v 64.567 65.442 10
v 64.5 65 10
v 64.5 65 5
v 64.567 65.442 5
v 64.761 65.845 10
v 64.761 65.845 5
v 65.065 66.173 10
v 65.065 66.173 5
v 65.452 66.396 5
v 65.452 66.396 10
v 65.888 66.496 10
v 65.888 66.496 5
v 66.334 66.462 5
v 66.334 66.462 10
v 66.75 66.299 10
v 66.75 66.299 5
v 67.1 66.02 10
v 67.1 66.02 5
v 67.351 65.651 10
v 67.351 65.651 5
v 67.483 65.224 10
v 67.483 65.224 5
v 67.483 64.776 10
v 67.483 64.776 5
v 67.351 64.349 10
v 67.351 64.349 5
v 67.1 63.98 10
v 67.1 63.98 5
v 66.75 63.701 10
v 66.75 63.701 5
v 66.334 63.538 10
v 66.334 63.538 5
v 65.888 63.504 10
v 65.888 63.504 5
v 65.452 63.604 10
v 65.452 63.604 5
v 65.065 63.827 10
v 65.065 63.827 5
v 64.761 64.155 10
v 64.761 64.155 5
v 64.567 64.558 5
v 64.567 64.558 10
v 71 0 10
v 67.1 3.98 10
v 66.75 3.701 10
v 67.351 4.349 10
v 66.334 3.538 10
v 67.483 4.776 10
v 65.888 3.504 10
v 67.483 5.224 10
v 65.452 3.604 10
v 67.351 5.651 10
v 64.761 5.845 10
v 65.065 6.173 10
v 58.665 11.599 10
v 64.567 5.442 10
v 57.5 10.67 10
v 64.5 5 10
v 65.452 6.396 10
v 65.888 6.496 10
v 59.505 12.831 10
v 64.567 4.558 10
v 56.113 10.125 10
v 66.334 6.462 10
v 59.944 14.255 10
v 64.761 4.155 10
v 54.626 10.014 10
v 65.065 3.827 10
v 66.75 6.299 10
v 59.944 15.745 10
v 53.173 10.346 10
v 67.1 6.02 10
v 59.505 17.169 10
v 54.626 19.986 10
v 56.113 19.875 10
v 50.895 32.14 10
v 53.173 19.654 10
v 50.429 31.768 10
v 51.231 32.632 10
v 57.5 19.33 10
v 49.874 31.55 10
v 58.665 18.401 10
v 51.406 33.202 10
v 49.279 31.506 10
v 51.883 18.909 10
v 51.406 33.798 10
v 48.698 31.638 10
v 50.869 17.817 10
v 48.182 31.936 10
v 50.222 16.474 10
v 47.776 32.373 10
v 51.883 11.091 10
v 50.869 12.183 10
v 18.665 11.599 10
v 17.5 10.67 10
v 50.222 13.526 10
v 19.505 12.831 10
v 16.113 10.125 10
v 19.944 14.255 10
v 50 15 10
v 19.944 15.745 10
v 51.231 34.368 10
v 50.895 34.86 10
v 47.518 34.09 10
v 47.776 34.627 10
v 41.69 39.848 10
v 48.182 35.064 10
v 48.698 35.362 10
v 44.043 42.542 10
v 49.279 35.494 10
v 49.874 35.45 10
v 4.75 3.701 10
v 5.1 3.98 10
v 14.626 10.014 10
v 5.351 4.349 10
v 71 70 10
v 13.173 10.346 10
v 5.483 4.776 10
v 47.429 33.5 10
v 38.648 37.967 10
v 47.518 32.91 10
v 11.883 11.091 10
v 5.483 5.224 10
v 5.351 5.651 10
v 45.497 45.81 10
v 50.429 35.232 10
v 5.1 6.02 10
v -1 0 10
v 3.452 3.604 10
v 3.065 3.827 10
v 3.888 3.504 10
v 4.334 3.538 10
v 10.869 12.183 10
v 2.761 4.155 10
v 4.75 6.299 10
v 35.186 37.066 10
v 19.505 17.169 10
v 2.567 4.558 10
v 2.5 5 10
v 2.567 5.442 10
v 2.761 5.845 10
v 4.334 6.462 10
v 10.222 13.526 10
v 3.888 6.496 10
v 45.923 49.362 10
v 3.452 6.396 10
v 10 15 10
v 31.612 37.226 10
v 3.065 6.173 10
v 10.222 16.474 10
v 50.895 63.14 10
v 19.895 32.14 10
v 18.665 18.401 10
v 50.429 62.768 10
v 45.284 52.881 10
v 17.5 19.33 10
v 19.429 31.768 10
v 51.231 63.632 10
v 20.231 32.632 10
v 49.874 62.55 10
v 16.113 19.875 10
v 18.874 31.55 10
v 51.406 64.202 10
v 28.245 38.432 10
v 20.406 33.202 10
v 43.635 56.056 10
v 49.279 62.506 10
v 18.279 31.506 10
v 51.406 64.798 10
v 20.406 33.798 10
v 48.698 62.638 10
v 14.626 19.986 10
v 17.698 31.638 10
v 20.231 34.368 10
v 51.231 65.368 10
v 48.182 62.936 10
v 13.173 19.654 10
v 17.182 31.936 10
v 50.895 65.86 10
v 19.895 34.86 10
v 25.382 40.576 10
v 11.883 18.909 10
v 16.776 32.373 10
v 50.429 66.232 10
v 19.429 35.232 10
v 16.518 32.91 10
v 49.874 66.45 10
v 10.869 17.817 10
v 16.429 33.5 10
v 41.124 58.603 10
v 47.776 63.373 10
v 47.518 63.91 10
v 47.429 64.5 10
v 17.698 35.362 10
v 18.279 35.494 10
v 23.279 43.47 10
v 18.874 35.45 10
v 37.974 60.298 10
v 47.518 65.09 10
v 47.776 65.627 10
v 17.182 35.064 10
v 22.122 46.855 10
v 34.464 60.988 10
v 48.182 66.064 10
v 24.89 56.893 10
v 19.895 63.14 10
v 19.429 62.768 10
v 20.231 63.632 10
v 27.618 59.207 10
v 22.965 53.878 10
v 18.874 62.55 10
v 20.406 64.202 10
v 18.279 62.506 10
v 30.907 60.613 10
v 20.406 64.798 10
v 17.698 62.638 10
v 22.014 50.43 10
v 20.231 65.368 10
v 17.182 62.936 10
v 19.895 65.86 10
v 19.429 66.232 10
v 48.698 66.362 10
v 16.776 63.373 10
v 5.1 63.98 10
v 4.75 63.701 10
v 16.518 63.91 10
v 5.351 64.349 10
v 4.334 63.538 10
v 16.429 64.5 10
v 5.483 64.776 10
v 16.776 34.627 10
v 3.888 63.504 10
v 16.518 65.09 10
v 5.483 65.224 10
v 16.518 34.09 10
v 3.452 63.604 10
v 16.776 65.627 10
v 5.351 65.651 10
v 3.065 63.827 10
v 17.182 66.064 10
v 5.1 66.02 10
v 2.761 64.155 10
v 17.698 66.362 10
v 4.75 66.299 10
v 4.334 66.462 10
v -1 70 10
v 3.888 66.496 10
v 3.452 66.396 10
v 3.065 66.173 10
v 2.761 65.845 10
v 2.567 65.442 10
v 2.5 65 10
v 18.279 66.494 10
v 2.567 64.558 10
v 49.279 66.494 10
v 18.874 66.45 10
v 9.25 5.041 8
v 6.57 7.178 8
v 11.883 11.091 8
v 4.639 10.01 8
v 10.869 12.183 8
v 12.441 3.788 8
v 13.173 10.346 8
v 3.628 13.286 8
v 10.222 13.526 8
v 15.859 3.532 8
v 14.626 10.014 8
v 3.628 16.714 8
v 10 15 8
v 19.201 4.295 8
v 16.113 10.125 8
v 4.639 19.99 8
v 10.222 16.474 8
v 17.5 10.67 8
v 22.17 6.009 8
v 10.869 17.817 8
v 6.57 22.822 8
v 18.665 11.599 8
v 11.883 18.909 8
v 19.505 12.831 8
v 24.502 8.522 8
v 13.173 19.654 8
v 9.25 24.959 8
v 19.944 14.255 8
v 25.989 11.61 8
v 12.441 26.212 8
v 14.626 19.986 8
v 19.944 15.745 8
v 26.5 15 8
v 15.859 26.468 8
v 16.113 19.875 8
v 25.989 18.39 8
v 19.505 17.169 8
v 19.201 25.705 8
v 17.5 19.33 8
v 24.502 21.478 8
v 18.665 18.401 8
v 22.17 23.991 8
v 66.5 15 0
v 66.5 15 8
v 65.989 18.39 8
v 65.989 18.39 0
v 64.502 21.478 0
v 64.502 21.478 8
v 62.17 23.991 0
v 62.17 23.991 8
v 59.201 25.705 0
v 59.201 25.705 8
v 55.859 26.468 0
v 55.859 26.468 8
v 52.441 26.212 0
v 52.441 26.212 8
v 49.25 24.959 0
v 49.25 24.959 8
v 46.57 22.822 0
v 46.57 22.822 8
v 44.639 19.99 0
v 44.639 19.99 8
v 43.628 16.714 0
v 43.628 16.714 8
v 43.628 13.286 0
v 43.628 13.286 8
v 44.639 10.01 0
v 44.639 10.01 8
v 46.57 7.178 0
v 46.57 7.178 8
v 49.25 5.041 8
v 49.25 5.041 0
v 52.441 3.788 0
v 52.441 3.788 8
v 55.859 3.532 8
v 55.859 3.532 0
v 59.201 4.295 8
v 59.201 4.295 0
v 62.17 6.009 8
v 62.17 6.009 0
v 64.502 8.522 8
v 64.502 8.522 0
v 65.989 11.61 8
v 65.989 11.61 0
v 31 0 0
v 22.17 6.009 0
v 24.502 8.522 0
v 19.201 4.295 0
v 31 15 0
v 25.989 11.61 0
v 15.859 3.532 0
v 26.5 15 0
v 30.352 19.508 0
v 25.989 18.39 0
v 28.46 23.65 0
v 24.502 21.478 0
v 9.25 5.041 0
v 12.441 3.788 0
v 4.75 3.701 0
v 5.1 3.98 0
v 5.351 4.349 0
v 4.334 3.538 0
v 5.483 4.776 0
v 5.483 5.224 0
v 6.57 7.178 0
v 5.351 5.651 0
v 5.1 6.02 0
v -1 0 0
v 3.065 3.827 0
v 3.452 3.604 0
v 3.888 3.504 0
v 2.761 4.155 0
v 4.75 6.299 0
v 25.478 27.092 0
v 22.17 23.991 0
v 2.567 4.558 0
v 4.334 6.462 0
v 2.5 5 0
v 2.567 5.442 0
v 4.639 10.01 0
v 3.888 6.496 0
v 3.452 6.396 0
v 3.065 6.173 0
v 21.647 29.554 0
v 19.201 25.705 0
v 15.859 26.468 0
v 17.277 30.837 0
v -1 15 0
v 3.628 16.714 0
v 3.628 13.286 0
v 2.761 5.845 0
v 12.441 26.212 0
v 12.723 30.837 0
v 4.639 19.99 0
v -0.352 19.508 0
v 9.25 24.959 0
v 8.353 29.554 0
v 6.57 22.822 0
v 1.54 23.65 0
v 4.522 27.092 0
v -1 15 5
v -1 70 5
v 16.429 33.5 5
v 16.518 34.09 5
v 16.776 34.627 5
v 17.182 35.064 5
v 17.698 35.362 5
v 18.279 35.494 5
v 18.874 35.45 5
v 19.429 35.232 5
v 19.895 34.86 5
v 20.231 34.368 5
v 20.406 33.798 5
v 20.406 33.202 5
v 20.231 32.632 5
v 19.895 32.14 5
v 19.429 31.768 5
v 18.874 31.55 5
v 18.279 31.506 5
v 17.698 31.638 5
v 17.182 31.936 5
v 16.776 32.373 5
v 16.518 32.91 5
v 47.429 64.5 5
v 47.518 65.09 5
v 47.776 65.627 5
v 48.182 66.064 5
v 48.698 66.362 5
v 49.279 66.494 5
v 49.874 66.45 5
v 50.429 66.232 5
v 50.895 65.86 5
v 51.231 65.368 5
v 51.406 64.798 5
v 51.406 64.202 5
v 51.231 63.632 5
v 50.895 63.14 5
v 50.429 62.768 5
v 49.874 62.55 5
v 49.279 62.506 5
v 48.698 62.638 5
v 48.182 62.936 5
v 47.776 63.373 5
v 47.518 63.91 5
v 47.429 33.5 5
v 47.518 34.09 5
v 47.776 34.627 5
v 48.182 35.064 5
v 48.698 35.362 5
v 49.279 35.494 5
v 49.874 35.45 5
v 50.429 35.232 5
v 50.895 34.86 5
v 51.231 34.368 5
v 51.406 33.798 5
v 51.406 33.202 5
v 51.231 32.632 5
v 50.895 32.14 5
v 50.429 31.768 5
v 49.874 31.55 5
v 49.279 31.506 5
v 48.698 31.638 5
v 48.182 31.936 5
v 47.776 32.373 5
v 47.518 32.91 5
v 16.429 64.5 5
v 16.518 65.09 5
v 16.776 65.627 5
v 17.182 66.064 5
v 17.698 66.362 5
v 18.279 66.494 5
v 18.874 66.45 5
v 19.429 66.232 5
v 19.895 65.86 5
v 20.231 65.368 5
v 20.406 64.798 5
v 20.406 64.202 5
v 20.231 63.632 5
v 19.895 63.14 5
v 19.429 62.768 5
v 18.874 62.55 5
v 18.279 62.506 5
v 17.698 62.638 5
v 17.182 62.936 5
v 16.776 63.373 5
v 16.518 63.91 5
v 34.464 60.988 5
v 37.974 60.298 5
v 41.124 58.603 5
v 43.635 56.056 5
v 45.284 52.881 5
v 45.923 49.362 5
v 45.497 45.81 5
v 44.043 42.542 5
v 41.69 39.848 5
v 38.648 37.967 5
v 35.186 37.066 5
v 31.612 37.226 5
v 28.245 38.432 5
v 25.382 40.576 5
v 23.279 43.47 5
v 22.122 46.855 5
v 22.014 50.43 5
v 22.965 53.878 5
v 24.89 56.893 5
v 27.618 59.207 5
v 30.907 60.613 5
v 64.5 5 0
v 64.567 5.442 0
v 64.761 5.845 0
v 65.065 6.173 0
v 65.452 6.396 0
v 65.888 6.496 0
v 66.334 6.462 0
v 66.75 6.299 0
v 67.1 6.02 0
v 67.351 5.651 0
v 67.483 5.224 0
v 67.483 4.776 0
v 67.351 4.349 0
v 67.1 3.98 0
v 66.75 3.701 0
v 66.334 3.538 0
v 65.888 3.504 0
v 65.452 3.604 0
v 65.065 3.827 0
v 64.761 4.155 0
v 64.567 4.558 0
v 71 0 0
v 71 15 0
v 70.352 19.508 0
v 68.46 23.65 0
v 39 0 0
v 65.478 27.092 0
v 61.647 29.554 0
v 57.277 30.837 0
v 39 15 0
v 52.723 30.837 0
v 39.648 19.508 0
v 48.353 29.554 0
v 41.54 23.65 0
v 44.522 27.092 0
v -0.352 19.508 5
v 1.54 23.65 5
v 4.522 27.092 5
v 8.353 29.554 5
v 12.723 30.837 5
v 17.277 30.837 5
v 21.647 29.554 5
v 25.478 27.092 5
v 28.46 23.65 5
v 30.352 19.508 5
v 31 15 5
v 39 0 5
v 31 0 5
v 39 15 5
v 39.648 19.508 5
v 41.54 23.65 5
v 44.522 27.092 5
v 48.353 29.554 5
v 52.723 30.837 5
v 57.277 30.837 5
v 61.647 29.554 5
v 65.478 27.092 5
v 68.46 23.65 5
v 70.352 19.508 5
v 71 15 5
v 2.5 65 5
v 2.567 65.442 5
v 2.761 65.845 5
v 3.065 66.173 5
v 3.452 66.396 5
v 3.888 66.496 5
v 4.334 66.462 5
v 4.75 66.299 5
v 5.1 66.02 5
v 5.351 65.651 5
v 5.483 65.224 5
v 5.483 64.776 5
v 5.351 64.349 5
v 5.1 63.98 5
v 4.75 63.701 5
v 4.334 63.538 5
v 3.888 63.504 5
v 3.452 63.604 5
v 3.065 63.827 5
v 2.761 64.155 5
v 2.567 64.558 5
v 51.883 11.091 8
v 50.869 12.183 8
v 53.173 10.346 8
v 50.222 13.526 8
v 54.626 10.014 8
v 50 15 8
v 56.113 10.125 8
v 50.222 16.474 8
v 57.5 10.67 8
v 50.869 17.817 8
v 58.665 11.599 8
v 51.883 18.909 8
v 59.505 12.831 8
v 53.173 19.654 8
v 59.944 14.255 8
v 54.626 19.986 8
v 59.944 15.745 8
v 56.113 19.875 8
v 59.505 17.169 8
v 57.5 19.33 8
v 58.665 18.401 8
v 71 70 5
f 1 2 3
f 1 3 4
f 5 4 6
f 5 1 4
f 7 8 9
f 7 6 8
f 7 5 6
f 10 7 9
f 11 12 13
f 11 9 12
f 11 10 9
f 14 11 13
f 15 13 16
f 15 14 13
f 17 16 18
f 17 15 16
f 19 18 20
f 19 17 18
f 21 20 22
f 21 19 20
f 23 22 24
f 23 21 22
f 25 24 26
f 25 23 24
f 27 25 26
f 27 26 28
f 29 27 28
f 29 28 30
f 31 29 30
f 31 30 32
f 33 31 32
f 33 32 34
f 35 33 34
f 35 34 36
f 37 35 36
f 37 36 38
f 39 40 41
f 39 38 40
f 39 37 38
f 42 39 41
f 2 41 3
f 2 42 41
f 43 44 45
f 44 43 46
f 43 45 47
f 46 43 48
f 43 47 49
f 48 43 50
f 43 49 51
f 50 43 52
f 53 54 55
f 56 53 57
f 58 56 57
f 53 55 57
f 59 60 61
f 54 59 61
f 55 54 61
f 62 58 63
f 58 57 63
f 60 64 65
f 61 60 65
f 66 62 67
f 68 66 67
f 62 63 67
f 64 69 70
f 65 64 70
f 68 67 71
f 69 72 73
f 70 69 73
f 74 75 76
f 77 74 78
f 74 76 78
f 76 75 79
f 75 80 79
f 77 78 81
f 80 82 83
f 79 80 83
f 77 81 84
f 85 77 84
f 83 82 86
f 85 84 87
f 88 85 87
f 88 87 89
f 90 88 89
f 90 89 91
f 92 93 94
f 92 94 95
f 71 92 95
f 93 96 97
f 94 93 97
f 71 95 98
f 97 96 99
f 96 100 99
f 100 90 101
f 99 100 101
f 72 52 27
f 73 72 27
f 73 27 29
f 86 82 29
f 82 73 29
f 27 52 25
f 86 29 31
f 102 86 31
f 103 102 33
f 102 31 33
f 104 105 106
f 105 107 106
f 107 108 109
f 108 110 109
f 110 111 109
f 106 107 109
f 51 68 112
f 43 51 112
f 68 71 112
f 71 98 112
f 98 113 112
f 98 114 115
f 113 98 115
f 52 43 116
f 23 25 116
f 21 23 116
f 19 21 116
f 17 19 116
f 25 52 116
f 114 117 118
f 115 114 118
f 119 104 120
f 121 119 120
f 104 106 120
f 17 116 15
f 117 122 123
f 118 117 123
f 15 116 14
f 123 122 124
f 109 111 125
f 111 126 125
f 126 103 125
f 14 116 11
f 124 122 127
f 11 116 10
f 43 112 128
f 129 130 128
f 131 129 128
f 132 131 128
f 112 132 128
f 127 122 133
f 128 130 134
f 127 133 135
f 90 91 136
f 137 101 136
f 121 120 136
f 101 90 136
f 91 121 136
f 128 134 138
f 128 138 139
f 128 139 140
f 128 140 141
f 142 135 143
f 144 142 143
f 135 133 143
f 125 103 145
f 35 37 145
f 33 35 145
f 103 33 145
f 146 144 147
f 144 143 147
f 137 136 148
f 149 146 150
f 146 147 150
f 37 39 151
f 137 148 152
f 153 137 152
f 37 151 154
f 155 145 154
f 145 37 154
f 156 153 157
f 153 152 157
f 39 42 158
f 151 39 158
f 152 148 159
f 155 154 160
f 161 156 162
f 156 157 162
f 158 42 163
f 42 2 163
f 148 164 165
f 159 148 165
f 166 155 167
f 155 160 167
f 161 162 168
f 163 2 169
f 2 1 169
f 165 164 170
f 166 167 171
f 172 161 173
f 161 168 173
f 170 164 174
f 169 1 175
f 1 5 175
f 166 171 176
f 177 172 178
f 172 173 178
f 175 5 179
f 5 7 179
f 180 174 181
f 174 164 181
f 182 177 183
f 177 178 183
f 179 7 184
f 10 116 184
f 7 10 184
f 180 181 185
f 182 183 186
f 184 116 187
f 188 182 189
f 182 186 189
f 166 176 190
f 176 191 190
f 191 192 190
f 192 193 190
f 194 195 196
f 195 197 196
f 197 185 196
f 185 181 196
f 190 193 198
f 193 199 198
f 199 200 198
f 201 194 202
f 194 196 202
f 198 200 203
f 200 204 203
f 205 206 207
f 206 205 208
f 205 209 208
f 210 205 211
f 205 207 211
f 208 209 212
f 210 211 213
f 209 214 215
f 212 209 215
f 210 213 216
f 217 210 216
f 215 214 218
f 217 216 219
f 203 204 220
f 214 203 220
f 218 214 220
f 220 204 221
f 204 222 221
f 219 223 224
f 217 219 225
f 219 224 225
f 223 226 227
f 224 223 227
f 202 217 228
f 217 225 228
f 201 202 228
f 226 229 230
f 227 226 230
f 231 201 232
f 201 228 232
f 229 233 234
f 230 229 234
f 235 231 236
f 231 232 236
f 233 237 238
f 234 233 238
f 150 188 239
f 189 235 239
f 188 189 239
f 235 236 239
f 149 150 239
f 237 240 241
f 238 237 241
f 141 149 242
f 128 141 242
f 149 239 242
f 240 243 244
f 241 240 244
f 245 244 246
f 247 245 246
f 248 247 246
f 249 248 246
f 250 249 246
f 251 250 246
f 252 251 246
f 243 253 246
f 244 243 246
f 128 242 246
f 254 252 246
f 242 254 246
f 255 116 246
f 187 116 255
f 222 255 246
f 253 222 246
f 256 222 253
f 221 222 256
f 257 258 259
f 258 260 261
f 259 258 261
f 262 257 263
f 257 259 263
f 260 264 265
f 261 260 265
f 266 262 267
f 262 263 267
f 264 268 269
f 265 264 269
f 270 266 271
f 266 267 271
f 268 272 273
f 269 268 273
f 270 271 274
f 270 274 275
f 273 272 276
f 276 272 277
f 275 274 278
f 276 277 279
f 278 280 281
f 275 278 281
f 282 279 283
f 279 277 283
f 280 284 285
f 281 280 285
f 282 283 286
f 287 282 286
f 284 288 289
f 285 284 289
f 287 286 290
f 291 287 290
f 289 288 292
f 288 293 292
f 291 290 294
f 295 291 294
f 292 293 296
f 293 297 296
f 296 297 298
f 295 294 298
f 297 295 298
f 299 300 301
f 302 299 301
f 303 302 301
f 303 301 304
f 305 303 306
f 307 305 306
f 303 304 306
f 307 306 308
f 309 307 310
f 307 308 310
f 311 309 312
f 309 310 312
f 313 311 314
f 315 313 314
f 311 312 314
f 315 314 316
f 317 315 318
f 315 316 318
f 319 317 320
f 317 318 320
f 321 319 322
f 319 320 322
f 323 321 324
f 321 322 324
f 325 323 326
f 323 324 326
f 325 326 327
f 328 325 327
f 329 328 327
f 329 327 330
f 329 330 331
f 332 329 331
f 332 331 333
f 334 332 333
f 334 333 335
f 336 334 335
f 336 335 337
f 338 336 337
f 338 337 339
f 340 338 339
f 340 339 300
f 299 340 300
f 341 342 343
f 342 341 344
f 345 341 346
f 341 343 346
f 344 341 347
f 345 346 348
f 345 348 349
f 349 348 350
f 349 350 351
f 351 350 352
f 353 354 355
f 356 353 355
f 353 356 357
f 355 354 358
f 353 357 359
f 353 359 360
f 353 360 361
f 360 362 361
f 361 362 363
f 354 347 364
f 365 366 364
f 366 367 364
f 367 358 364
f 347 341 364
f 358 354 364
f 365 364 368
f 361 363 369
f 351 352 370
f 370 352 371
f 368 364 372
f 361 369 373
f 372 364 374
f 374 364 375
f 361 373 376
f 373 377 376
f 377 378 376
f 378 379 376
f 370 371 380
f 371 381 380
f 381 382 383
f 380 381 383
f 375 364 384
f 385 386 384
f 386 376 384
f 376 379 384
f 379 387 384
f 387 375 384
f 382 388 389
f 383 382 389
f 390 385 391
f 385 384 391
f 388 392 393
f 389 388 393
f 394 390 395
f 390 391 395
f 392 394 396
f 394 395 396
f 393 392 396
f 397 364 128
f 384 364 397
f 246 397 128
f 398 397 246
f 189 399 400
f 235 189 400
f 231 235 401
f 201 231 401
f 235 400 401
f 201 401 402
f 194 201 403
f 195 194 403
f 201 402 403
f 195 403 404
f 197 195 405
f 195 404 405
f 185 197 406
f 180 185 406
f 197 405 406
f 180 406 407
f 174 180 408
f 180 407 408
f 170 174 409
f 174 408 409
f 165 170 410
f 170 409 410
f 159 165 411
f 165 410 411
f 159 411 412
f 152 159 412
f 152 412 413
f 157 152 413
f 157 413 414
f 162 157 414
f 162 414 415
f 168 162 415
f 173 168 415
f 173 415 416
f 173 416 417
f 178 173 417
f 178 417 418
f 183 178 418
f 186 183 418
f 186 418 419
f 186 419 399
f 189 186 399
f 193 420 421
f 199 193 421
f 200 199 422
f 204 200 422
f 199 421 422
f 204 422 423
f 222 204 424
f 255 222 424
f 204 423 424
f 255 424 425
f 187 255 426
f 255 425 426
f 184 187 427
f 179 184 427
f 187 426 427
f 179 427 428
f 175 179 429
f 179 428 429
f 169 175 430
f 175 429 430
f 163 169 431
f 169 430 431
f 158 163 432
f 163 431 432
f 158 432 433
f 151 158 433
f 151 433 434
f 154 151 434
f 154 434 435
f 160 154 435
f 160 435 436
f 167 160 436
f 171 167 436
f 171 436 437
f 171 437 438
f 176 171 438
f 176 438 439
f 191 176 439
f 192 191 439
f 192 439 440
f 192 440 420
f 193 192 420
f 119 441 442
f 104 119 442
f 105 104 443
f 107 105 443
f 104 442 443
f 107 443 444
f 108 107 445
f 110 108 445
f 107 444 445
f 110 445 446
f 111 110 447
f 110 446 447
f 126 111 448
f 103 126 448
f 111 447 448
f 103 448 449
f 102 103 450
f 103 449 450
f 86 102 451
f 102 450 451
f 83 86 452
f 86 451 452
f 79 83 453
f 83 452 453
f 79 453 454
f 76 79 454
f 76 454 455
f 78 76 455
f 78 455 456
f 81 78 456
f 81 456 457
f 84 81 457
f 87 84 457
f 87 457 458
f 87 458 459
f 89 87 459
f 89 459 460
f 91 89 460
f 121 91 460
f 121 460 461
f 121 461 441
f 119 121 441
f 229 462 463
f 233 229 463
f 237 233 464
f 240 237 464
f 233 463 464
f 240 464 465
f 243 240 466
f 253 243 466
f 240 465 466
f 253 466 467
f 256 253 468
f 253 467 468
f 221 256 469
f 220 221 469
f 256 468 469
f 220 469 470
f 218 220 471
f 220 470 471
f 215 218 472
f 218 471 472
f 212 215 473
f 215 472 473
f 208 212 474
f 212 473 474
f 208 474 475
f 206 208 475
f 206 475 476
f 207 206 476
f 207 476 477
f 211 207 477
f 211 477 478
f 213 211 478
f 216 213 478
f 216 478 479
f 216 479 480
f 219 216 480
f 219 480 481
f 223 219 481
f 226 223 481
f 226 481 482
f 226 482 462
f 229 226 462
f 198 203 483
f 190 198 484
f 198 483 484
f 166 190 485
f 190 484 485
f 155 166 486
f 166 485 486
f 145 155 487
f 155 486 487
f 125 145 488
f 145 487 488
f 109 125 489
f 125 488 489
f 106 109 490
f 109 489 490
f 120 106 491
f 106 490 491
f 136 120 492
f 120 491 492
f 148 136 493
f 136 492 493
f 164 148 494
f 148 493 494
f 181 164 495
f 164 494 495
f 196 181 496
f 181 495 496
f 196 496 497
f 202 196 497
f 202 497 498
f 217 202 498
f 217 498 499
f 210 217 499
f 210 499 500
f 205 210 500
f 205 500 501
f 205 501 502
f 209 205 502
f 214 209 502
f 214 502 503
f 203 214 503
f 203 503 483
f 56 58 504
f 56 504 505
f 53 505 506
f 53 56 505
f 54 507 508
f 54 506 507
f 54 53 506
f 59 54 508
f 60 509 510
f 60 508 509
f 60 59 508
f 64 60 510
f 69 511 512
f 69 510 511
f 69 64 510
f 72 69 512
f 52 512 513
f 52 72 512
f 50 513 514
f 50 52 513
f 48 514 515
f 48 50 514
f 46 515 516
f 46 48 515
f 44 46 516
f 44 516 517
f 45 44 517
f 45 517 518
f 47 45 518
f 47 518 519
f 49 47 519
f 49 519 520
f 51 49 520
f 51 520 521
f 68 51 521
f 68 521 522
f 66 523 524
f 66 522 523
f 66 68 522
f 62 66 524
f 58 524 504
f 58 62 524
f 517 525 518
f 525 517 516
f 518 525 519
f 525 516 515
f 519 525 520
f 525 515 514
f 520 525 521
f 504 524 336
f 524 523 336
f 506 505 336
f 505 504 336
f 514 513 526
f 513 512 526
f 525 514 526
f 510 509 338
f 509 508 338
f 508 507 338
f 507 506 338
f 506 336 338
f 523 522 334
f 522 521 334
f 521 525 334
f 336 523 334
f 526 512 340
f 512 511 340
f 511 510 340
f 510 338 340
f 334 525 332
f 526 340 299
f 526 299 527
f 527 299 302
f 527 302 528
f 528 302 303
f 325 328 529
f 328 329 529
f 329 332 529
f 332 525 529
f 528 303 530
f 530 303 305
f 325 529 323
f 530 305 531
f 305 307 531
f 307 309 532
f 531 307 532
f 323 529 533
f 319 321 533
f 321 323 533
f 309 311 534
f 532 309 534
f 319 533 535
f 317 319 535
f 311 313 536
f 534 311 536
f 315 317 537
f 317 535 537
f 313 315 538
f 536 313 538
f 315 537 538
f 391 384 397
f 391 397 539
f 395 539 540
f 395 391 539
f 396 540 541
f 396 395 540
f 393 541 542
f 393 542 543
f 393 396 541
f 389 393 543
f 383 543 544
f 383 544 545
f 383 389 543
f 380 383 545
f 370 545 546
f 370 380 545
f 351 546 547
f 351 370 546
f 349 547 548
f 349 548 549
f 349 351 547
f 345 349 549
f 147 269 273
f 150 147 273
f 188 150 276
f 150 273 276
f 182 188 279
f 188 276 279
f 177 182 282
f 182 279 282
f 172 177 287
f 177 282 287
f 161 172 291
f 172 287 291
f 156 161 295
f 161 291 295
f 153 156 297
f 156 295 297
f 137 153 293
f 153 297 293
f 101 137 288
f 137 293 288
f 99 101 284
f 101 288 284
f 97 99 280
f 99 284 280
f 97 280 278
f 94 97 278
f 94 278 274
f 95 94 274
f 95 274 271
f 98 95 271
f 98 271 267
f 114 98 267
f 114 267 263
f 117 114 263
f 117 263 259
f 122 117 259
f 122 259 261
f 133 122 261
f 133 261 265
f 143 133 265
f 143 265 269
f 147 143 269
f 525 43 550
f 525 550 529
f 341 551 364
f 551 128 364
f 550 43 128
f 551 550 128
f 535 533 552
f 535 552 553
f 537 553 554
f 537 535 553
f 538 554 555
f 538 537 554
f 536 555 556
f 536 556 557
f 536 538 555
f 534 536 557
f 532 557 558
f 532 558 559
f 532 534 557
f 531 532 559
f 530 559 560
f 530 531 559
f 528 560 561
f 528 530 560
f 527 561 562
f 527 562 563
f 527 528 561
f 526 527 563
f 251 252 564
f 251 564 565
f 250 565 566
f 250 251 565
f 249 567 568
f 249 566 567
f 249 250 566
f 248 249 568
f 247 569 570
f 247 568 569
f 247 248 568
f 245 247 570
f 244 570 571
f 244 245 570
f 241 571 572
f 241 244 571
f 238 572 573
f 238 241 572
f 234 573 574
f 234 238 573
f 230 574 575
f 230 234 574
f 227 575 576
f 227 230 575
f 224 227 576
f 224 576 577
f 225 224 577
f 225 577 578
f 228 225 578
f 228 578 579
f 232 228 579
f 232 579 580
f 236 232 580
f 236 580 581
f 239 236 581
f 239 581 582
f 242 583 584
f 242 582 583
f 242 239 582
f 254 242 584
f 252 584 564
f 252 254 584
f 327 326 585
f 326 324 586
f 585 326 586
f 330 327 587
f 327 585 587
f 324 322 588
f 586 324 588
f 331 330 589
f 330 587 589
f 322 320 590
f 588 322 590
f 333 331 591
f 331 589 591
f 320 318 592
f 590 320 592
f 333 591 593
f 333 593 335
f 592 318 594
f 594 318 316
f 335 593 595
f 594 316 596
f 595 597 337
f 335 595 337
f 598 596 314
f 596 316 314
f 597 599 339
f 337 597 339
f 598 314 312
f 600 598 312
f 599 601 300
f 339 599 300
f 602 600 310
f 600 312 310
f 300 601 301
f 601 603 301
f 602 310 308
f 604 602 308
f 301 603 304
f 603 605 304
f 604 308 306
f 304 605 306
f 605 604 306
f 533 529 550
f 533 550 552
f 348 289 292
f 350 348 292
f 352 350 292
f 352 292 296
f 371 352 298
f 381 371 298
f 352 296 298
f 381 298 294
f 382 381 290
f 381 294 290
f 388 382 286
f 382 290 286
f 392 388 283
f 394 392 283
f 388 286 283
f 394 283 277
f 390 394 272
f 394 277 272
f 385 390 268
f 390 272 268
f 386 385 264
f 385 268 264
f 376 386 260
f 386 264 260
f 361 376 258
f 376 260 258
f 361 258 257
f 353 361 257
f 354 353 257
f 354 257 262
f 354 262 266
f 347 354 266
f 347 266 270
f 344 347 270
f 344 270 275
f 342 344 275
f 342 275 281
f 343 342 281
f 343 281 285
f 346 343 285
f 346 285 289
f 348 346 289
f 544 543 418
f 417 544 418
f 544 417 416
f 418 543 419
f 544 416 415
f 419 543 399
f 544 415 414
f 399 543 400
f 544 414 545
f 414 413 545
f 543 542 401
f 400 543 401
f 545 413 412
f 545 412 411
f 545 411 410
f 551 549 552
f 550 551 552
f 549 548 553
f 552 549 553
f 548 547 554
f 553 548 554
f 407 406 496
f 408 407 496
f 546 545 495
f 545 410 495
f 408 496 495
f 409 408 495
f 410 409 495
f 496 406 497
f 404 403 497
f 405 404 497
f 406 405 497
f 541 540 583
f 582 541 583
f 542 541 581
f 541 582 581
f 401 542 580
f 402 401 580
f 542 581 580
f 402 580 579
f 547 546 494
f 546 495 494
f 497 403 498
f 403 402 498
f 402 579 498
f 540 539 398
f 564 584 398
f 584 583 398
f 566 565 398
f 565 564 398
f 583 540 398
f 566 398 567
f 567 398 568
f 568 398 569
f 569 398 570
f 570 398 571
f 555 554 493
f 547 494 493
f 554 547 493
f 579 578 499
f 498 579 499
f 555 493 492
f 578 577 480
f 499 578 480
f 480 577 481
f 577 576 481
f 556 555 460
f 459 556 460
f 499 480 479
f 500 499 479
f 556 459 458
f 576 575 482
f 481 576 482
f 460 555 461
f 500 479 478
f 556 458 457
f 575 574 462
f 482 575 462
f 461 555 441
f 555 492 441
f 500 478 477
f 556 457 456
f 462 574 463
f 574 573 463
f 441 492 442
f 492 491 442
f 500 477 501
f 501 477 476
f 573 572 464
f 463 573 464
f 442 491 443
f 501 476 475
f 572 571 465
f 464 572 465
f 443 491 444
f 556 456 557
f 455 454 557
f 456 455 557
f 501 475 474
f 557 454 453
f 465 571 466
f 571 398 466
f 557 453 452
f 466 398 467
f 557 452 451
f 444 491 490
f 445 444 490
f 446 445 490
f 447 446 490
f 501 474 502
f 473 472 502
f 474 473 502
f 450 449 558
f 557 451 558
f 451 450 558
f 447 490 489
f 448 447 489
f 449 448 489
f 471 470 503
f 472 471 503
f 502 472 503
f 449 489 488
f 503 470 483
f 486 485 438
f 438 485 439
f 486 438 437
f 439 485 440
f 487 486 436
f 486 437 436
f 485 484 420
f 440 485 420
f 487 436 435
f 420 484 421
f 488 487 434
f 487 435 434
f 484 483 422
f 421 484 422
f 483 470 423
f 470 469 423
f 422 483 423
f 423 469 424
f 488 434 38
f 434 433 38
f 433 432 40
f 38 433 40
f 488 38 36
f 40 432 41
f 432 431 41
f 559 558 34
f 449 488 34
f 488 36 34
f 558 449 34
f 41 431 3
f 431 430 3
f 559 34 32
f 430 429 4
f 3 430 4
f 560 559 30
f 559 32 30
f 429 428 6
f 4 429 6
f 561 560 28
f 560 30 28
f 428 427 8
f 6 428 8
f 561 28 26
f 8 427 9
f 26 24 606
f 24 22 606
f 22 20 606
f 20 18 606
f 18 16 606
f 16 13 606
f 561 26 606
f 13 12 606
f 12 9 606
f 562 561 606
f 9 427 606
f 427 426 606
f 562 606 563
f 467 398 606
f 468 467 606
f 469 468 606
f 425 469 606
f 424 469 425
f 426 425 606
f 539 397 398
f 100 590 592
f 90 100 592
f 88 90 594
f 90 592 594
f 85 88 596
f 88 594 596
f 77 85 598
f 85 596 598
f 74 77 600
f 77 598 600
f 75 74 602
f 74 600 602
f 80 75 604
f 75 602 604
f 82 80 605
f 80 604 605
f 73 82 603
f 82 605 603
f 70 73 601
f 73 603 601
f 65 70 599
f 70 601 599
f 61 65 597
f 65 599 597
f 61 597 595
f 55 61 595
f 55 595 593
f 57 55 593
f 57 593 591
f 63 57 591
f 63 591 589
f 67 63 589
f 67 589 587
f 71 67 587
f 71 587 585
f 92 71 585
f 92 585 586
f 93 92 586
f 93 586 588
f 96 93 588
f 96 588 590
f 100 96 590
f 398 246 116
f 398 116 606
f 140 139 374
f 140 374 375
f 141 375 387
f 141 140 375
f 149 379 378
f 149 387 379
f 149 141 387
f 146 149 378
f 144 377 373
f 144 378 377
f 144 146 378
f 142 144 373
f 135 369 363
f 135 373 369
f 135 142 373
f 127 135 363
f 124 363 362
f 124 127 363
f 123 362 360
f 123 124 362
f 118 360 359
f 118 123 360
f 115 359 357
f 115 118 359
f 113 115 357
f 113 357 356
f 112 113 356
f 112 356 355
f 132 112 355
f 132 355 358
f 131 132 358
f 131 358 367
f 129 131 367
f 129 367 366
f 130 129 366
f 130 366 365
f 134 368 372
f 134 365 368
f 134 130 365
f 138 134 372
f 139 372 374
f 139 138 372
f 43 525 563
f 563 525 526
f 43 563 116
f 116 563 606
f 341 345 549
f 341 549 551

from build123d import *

# Parameters (mm, degrees)
SKETCH1_W               = 70
SKETCH1_H               = 70
BOSS_EXTRUDE1_DEPTH     = 10
SKETCH2_R               = 12
SKETCH2_R_2             = 2
SKETCH2_R_3             = 11.5
CUT_EXTRUDE1_DEPTH      = 10
SKETCH3_W               = 10
SKETCH3_H               = 70
BOSS_EXTRUDE2_DEPTH     = 15
SKETCH4_W               = 10
SKETCH4_H               = 70
BOSS_EXTRUDE3_DEPTH     = 15
SKETCH5_R               = 11.5
SKETCH5_R_2             = 4
BOSS_EXTRUDE4_DEPTH     = 2
SKETCH6_R               = 1.5
SKETCH6_R_2             = 1.648708122
CUT_EXTRUDE3_DEPTH      = 10
BOSS_EXTRUDE5_START     = -10
SKETCH7_R               = 11.986708095
SKETCH7_R_2             = 2
BOSS_EXTRUDE5_DEPTH     = 10
SKETCH8_R               = 12
CUT_EXTRUDE4_DEPTH      = 10
SKETCH9_R               = 2
CUT_EXTRUDE5_DEPTH      = 10
CUT_EXTRUDE7_DEPTH      = 5
SKETCH15_W              = 14
SKETCH15_H              = 70
CUT_EXTRUDE8_DEPTH      = 5
CUT_EXTRUDE9_DEPTH      = 19
CUT_EXTRUDE9_DEPTH_BACK = 48
SKETCH16_R              = 1.5
SKETCH17_R              = 5
CUT_EXTRUDE10_DEPTH     = 19
SKETCH18_R              = 16.289174866
SKETCH18_R_2            = 12
BOSS_EXTRUDE6_DEPTH     = 5


with BuildPart() as part:
    # Sketch1 → Boss-Extrude1 (new body)
    with BuildSketch(Plane.XY):
        with Locations((35, 35)):
            Rectangle(SKETCH1_W, SKETCH1_H)
    extrude(amount=BOSS_EXTRUDE1_DEPTH)

    # Sketch2 → Cut-Extrude1 (cut)
    with BuildSketch(Plane.XY.offset(10)):
        with Locations((35, 49)):
            Circle(SKETCH2_R)
        with Locations((19.5, 65)):
            Circle(SKETCH2_R_2)
        with Locations((50.5, 65)):
            Circle(SKETCH2_R_2)
        with Locations((19.5, 34)):
            Circle(SKETCH2_R_2)
        with Locations((50.5, 34)):
            Circle(SKETCH2_R_2)
        with Locations((15, 15)):
            Circle(SKETCH2_R_3)
        with Locations((55, 15)):
            Circle(SKETCH2_R_3)
    extrude(amount=-CUT_EXTRUDE1_DEPTH, mode=Mode.SUBTRACT)

    # Sketch3 → Boss-Extrude2 (add)
    with BuildSketch(Plane.ZY):
        with Locations((5, 35)):
            Rectangle(SKETCH3_W, SKETCH3_H)
    extrude(amount=BOSS_EXTRUDE2_DEPTH)

    # Sketch4 → Boss-Extrude3 (add)
    with BuildSketch(Plane(origin=(70, 0, 0), x_dir=(0, 0, -1), z_dir=(1, 0, 0))):
        with Locations((-5, 35)):
            Rectangle(SKETCH4_W, SKETCH4_H)
    extrude(amount=BOSS_EXTRUDE3_DEPTH)

    # Sketch5 → Boss-Extrude4 (add)
    # profile 1 of 2: a face of its own
    with BuildSketch(Plane.XY.offset(10)):
        with Locations((15, 15)):
            Circle(SKETCH5_R)
        with Locations((15, 15)):
            Circle(SKETCH5_R_2, mode=Mode.SUBTRACT)
    # profile 2 of 2: a face of its own
    with BuildSketch(Plane.XY.offset(10)):
        with Locations((55, 15)):
            Circle(SKETCH5_R)
        with Locations((55, 15)):
            Circle(SKETCH5_R_2, mode=Mode.SUBTRACT)
    extrude(amount=-BOSS_EXTRUDE4_DEPTH)

    # Sketch6 → Cut-Extrude3 (cut)
    with BuildSketch(Plane(origin=(0, 0, 0), x_dir=(-1, 0, 0), z_dir=(0, 0, -1))):
        with Locations((-80, 65)):
            Circle(SKETCH6_R)
        with Locations((-80, 5)):
            Circle(SKETCH6_R)
        with Locations((10, 65)):
            Circle(SKETCH6_R_2)
        with Locations((10, 5)):
            Circle(SKETCH6_R)
    extrude(amount=-CUT_EXTRUDE3_DEPTH, mode=Mode.SUBTRACT)

    # Sketch7 → Boss-Extrude5 (add)
    with BuildSketch(Plane(origin=(0, 0, 0), x_dir=(-1, 0, 0), z_dir=(0, 0, -1)).offset(BOSS_EXTRUDE5_START)):
        with Locations((-35, 49)):
            Circle(SKETCH7_R)
        with Locations((-50.5, 65)):
            Circle(SKETCH7_R_2)
        with Locations((-19.5, 65)):
            Circle(SKETCH7_R_2)
        with Locations((-19.5, 34)):
            Circle(SKETCH7_R_2)
        with Locations((-50.5, 34)):
            Circle(SKETCH7_R_2)
    extrude(amount=BOSS_EXTRUDE5_DEPTH)


with BuildPart() as boss_extrude5_piece_1:
    # of the separate pieces the step leaves, piece 1, a body of its own (boss_extrude5_pieces)
    add(part.part.solids().sort_by_distance((-15, 0, 0))[0])


with BuildPart() as boss_extrude5_piece_2:
    # of the separate pieces the step leaves, piece 2, a body of its own (boss_extrude5_pieces)
    add(part.part.solids().sort_by_distance((23.013291905, 49, 10))[0])


with BuildPart() as cut_extrude4_tool:
    # Sketch8 → Cut-Extrude4 (new body)
    with BuildSketch(Plane(origin=(0, 0, 0), x_dir=(-1, 0, 0), z_dir=(0, 0, -1))):
        with Locations((-33.928692494, 49)):
            Circle(SKETCH8_R)
    extrude(amount=-CUT_EXTRUDE4_DEPTH)


with BuildPart() as boss_extrude5_piece_1_1:
    add(boss_extrude5_piece_1.part)

    # Cut-Extrude4: cut by cut_extrude4_tool
    add(cut_extrude4_tool.part, mode=Mode.SUBTRACT)

    # Sketch9 → Cut-Extrude5 (cut)
    with BuildSketch(Plane(origin=(0, 0, 0), x_dir=(-1, 0, 0), z_dir=(0, 0, -1))):
        with Locations((-49.428692494, 64.5)):
            Circle(SKETCH9_R)
        with Locations((-49.428692494, 33.5)):
            Circle(SKETCH9_R)
        with Locations((-18.428692494, 33.5)):
            Circle(SKETCH9_R)
        with Locations((-18.428692494, 64.5)):
            Circle(SKETCH9_R)
    extrude(amount=-CUT_EXTRUDE5_DEPTH, mode=Mode.SUBTRACT)


with BuildPart() as boss_extrude5_piece_2_1:
    add(boss_extrude5_piece_2.part)

    # Cut-Extrude4: cut by cut_extrude4_tool
    add(cut_extrude4_tool.part, mode=Mode.SUBTRACT)


with BuildPart() as cut_extrude7_tool:
    # Sketch14 → Cut-Extrude7 (new body)
    with BuildSketch(Plane(origin=(0, 0, 0), x_dir=(-1, 0, 0), z_dir=(0, 0, -1))):
        with BuildLine():
            Line((-85, 0), (-85, 70))
            Line((-85, 70), (15, 70))
            Line((15, 70), (15, 0))
            Line((15, 0), (1, 0))
            Line((1, 0), (1, 15))
            ThreePointArc((1, 15), (-15, 31), (-31, 15))
            Line((-31, 15), (-31, 0))
            Line((-31, 0), (-39, 0))
            Line((-39, 0), (-39, 15))
            ThreePointArc((-39, 15), (-55, 31), (-71, 15))
            Line((-71, 15), (-71, 0))
            Line((-71, 0), (-85, 0))
        make_face()
    extrude(amount=-CUT_EXTRUDE7_DEPTH)


with BuildPart() as boss_extrude5_piece_1_2:
    add(boss_extrude5_piece_1_1.part)

    # Cut-Extrude7: cut by cut_extrude7_tool
    add(cut_extrude7_tool.part, mode=Mode.SUBTRACT)

    # Sketch15 → Cut-Extrude8 (cut)
    with BuildSketch(Plane(origin=(0, 0, 5), x_dir=(-1, 0, 0), z_dir=(0, 0, -1))):
        with Locations((-78, 35)):
            Rectangle(SKETCH15_W, SKETCH15_H)
        with Locations((8, 35)):
            Rectangle(SKETCH15_W, SKETCH15_H)
    extrude(amount=-CUT_EXTRUDE8_DEPTH, mode=Mode.SUBTRACT)

    # Sketch16 → Cut-Extrude9 (cut, two sides: drawn at the far end of the back side and taken through both)
    with BuildSketch(Plane(origin=(0, 0, 5), x_dir=(-1, 0, 0), z_dir=(0, 0, -1)).offset(-CUT_EXTRUDE9_DEPTH_BACK)):
        with Locations((-66, 65)):
            Circle(SKETCH16_R)
        with Locations((-66, 5)):
            Circle(SKETCH16_R)
        with Locations((-4, 5)):
            Circle(SKETCH16_R)
        with Locations((-4, 65)):
            Circle(SKETCH16_R)
    extrude(amount=CUT_EXTRUDE9_DEPTH + CUT_EXTRUDE9_DEPTH_BACK, mode=Mode.SUBTRACT)

    # Sketch17 → Cut-Extrude10 (cut)
    with BuildSketch(Plane(origin=(0, 0, 8), x_dir=(-1, 0, 0), z_dir=(0, 0, -1))):
        with Locations((-15, 15)):
            Circle(SKETCH17_R)
        with Locations((-55, 15)):
            Circle(SKETCH17_R)
    extrude(amount=-CUT_EXTRUDE10_DEPTH, mode=Mode.SUBTRACT)



with BuildPart() as boss_extrude5_piece_2_2:
    add(boss_extrude5_piece_2_1.part)

    # Cut-Extrude7: cut by cut_extrude7_tool
    add(cut_extrude7_tool.part, mode=Mode.SUBTRACT)


with BuildPart() as boss_extrude5_piece_1_3:
    add(boss_extrude5_piece_1_2.part)

    add(boss_extrude5_piece_2_2.part)  # Boss-Extrude6 merges Boss-Extrude5 piece 2
    # Sketch18 → Boss-Extrude6 (add)
    with BuildSketch(Plane(origin=(0, 0, 5), x_dir=(-1, 0, 0), z_dir=(0, 0, -1))):
        with Locations((-33.928692494, 49)):
            Circle(SKETCH18_R)
        with Locations((-33.928692494, 49)):
            Circle(SKETCH18_R_2, mode=Mode.SUBTRACT)
    extrude(amount=-BOSS_EXTRUDE6_DEPTH)


solid = boss_extrude5_piece_1_3.part
